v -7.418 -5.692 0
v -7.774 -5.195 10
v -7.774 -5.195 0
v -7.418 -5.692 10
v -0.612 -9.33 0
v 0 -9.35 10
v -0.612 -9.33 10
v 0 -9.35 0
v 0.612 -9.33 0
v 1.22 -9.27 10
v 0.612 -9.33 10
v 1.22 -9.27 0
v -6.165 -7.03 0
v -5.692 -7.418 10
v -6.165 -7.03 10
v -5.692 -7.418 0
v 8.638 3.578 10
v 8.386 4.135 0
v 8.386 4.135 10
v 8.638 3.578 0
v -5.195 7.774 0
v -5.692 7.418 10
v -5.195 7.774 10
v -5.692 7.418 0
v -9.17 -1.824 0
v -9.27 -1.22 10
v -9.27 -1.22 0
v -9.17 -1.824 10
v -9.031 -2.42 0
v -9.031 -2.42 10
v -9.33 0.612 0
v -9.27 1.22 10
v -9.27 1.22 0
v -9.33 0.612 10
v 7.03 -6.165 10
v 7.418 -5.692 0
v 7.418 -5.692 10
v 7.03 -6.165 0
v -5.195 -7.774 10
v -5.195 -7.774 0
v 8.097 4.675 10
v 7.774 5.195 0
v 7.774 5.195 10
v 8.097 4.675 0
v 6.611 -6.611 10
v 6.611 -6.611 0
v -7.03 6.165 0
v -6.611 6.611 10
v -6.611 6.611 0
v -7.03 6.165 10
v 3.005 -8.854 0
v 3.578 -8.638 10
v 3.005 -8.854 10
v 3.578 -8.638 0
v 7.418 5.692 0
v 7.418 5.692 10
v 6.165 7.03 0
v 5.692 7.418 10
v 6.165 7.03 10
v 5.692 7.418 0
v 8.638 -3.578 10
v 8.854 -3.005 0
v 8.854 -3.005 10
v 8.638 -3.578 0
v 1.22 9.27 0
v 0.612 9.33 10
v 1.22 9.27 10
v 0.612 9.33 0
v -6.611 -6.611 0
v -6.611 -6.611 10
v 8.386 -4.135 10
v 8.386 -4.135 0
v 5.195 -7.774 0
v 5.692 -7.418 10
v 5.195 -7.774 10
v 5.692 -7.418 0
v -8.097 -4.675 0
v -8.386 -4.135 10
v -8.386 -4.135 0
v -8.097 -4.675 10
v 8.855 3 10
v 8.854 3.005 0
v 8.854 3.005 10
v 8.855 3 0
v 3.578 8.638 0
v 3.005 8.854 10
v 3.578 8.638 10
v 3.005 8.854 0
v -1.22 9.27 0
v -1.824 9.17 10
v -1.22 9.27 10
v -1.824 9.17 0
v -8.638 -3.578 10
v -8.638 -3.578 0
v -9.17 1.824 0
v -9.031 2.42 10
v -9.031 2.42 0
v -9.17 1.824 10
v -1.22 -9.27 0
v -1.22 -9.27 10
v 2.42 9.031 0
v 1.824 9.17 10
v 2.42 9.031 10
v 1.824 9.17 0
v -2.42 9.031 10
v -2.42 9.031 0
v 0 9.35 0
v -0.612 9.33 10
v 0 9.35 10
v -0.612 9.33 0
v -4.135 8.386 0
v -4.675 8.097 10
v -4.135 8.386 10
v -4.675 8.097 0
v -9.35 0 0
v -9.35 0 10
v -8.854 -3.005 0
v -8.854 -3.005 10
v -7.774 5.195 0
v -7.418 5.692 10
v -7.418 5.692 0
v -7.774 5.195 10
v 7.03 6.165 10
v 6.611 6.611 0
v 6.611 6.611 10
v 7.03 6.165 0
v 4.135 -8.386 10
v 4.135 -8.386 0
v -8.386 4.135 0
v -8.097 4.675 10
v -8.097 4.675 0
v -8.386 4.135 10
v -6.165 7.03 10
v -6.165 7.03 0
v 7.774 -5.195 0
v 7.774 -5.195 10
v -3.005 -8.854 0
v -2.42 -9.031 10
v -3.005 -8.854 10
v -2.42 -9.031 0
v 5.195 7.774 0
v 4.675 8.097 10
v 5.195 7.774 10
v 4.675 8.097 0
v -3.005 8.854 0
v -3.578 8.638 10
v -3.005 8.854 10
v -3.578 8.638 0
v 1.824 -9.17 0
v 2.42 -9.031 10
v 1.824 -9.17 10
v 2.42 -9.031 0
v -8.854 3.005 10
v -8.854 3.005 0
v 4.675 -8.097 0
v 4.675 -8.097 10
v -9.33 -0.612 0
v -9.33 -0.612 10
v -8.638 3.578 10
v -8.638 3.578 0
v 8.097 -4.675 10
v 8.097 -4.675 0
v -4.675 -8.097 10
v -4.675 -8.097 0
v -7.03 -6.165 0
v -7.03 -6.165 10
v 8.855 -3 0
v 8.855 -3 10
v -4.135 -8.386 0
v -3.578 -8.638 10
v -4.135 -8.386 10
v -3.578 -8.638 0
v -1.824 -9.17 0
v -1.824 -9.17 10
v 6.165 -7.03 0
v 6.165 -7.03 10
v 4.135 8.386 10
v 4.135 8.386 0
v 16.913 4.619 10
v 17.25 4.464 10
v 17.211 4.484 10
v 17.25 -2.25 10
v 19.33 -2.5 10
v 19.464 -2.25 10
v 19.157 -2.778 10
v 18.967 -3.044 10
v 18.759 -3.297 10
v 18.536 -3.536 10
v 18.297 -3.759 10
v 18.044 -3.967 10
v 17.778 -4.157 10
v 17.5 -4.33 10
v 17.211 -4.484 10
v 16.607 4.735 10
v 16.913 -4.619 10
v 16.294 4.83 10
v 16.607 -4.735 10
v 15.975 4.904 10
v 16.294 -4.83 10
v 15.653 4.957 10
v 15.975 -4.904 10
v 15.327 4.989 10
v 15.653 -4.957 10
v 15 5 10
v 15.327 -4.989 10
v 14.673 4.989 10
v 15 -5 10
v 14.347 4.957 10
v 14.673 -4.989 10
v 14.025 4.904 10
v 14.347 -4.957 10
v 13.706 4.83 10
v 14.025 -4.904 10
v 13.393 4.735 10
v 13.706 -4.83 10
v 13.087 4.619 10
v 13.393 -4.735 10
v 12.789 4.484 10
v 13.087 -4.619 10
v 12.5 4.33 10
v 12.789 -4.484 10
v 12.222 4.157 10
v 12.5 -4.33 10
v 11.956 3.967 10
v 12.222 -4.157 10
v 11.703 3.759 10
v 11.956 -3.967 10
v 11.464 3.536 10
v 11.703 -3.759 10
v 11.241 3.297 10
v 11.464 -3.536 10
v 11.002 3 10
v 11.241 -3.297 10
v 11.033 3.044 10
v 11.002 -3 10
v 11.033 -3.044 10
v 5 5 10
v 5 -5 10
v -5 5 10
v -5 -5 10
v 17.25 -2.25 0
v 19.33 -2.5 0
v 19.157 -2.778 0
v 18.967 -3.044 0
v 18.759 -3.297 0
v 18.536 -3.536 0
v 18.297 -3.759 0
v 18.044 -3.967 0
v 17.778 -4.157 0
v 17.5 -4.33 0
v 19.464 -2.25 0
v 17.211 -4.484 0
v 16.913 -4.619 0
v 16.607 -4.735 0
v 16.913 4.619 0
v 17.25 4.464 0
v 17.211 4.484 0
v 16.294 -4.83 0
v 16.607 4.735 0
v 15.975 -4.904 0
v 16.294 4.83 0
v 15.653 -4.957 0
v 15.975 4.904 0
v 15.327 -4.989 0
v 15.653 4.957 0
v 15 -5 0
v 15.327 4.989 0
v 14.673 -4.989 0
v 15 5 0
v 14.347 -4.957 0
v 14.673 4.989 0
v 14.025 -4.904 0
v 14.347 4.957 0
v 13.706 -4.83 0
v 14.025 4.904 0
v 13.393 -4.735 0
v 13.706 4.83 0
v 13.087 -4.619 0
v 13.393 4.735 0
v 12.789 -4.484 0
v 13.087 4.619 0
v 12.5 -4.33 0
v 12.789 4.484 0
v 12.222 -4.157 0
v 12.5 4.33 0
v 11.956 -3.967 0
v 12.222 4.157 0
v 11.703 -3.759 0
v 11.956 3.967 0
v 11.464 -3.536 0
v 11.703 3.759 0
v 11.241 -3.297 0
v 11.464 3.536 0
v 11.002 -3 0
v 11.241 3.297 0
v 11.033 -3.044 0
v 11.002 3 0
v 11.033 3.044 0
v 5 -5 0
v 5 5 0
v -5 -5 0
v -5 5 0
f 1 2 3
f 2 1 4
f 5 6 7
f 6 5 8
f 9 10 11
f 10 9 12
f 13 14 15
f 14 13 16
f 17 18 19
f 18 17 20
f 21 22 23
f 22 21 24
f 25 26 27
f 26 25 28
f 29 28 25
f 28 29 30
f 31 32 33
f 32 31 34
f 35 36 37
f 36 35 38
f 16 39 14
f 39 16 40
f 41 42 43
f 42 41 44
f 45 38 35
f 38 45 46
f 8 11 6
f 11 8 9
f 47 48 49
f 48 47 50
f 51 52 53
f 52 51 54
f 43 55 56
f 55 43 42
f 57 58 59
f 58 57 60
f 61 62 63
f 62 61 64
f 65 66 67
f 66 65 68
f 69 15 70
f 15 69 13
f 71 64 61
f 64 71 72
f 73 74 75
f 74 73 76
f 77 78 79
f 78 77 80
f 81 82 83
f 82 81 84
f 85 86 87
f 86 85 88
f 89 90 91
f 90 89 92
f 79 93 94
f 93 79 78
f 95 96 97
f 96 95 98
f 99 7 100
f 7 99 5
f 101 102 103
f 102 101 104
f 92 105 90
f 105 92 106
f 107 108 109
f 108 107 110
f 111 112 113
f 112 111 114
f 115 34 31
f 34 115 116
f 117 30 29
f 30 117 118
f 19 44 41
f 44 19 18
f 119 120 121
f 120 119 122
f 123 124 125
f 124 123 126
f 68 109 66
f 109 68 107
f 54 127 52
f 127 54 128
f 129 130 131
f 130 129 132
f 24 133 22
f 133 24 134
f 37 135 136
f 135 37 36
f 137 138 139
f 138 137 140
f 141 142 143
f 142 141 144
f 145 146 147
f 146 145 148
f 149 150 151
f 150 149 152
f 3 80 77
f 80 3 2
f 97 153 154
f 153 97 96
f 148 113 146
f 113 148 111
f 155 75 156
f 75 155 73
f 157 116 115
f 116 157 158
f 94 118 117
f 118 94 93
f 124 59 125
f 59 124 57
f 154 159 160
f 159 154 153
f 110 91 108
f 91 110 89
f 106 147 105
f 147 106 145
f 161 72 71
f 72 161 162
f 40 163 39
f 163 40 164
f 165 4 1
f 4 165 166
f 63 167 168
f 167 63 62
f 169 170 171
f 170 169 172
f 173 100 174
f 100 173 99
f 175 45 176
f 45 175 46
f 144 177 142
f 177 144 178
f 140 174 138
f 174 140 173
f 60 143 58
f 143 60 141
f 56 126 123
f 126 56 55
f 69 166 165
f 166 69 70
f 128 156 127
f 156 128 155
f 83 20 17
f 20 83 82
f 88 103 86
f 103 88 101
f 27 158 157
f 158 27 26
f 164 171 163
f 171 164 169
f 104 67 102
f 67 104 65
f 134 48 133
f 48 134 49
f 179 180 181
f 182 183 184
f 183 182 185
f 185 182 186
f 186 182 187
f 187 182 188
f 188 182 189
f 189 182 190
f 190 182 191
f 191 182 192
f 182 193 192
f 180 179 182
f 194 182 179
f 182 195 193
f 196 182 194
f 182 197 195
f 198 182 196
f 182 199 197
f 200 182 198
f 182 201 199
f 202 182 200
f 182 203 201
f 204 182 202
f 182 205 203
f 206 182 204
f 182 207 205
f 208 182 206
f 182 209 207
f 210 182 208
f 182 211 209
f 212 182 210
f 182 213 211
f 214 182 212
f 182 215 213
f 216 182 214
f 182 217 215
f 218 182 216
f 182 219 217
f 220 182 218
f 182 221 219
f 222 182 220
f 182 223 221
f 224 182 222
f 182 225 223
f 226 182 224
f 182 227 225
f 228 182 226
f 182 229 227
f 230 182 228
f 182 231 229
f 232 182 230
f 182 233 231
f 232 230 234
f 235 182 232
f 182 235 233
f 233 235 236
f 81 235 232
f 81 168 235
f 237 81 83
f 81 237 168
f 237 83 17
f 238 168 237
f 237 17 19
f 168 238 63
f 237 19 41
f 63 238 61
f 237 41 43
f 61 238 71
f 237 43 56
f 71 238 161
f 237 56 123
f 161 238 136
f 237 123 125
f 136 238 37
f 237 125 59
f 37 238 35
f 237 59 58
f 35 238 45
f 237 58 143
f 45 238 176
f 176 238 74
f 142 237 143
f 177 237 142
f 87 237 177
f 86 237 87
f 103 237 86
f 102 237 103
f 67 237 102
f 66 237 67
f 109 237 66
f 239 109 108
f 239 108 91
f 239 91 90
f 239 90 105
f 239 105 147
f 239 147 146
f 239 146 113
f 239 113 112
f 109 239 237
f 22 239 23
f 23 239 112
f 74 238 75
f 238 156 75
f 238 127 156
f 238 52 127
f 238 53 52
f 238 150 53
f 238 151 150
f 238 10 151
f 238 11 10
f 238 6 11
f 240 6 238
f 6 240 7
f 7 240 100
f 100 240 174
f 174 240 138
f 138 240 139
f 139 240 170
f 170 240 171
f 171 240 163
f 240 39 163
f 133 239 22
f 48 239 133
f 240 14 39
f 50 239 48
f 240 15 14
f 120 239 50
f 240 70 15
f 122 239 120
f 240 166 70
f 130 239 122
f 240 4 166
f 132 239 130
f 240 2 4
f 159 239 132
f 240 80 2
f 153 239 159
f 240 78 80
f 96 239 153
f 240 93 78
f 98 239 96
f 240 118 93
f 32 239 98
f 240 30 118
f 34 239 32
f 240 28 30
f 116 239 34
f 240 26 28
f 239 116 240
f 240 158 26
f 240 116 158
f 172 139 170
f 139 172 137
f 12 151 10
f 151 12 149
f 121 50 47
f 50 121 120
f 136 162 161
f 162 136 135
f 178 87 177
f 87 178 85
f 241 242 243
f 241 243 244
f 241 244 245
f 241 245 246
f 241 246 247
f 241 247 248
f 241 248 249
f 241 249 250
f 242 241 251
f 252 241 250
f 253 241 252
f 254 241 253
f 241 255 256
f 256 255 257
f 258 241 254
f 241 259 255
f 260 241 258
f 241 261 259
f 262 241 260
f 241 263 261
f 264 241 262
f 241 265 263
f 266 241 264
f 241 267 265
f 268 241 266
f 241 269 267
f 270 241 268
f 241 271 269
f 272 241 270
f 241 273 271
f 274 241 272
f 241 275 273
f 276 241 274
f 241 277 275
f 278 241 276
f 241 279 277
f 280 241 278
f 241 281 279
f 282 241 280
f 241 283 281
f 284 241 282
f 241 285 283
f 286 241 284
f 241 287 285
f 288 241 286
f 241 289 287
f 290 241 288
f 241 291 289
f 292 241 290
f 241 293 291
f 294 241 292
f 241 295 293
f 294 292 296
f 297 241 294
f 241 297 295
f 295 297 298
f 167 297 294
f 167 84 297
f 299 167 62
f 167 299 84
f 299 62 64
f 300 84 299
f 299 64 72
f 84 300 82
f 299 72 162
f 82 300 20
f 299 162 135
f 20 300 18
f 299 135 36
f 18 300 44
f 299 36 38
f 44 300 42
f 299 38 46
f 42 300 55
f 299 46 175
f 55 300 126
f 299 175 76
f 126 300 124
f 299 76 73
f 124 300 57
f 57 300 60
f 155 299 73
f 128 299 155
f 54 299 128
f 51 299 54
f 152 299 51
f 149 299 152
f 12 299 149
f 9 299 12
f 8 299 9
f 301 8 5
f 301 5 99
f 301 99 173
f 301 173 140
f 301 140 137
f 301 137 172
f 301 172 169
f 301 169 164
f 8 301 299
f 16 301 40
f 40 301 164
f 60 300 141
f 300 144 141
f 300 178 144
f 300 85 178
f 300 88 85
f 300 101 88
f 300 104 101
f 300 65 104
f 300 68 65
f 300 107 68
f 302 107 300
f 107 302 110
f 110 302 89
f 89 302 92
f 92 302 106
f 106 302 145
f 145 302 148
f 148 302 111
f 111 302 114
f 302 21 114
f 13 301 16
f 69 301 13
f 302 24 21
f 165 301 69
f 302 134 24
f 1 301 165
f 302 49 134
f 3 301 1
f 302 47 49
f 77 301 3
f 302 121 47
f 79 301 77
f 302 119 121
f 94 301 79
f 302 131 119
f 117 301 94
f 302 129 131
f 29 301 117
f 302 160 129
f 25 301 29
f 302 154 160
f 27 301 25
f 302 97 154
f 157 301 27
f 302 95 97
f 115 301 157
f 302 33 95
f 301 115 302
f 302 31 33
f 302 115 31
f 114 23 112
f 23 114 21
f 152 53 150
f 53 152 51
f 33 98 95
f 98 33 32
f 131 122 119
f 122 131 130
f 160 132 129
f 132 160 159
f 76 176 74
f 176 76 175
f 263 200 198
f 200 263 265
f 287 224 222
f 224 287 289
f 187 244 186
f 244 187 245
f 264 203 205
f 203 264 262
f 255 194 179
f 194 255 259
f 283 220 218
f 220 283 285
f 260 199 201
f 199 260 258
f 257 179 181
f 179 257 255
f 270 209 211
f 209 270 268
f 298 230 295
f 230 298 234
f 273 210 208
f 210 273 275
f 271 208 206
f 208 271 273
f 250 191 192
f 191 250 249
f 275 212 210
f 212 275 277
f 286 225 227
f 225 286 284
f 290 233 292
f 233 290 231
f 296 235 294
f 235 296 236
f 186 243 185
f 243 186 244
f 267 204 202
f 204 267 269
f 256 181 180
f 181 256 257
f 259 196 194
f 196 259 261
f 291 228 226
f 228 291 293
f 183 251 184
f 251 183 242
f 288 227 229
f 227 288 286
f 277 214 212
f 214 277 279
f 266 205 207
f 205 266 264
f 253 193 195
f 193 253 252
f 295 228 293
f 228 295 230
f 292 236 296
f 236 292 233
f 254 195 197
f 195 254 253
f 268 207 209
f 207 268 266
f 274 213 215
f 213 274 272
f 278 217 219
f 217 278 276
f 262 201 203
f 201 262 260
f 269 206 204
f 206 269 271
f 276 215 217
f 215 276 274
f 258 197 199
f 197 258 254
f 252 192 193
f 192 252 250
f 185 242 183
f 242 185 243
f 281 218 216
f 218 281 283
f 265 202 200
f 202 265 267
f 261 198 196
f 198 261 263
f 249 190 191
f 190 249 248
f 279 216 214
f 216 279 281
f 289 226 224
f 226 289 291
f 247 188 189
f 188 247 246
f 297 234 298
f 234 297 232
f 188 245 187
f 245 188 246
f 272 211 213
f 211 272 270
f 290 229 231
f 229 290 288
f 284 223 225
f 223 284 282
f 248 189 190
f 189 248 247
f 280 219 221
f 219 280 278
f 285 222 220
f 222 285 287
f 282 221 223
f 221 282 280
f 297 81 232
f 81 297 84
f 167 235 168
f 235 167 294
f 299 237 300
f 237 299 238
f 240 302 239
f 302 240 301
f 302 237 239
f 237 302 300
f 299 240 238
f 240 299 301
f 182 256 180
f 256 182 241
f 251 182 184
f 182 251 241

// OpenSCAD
// Tubing and stand rod snap-on clip
// Print orientation: flat on bed, z = 0 up to z = 10

// ---------------- Parameters ----------------
stand_d      = 12.7;   // stand rod diameter
stand_wall   = 3;       // stand ring wall thickness
stand_open   = 10;      // stand ring opening width (x < 0, -5 < y < 5)

tub_d        = 6;       // tubing inner diameter
tub_wall     = 2;       // tubing ring wall thickness
tub_x        = 15;      // tubing ring centre X
tub_open     = 4.5;     // tubing ring opening width (+X side)

bridge_w     = 6;       // bridge width (Y)
bridge_x0    = 8;       // bridge start X
bridge_x1    = 12;      // bridge end X

eps          = 0.5;     // cutter overshoot past faces
$fn          = 96;      // curve resolution

// ---------------- Derived ----------------
stand_d_out  = stand_d + 2 * stand_wall;   // 18.7 mm
tub_d_out    = tub_d + 2 * tub_wall;       // 10 mm

// ---------------- Model ----------------
difference() {
    union() {
        // Stand ring
        cylinder(d = stand_d_out, h = 10);

        // Tubing ring
        translate([tub_x, 0, 0])
            cylinder(d = tub_d_out, h = 10);

        // Solid bridge between rings
        translate([bridge_x0, -bridge_w / 2, 0])
            cube([bridge_x1 - bridge_x0, bridge_w, 10]);
    }

    // Openings cut through the full height
    translate([-stand_open / 2, -5, -eps])
        cube([stand_open, 10, 10 + 2 * eps]);   // stand opening

    translate([tub_x + tub_open / 2, -tub_open / 2, -eps])
        cube([tub_open, tub_d_out + 2 * eps, 10 + 2 * eps]);   // tubing opening
}
